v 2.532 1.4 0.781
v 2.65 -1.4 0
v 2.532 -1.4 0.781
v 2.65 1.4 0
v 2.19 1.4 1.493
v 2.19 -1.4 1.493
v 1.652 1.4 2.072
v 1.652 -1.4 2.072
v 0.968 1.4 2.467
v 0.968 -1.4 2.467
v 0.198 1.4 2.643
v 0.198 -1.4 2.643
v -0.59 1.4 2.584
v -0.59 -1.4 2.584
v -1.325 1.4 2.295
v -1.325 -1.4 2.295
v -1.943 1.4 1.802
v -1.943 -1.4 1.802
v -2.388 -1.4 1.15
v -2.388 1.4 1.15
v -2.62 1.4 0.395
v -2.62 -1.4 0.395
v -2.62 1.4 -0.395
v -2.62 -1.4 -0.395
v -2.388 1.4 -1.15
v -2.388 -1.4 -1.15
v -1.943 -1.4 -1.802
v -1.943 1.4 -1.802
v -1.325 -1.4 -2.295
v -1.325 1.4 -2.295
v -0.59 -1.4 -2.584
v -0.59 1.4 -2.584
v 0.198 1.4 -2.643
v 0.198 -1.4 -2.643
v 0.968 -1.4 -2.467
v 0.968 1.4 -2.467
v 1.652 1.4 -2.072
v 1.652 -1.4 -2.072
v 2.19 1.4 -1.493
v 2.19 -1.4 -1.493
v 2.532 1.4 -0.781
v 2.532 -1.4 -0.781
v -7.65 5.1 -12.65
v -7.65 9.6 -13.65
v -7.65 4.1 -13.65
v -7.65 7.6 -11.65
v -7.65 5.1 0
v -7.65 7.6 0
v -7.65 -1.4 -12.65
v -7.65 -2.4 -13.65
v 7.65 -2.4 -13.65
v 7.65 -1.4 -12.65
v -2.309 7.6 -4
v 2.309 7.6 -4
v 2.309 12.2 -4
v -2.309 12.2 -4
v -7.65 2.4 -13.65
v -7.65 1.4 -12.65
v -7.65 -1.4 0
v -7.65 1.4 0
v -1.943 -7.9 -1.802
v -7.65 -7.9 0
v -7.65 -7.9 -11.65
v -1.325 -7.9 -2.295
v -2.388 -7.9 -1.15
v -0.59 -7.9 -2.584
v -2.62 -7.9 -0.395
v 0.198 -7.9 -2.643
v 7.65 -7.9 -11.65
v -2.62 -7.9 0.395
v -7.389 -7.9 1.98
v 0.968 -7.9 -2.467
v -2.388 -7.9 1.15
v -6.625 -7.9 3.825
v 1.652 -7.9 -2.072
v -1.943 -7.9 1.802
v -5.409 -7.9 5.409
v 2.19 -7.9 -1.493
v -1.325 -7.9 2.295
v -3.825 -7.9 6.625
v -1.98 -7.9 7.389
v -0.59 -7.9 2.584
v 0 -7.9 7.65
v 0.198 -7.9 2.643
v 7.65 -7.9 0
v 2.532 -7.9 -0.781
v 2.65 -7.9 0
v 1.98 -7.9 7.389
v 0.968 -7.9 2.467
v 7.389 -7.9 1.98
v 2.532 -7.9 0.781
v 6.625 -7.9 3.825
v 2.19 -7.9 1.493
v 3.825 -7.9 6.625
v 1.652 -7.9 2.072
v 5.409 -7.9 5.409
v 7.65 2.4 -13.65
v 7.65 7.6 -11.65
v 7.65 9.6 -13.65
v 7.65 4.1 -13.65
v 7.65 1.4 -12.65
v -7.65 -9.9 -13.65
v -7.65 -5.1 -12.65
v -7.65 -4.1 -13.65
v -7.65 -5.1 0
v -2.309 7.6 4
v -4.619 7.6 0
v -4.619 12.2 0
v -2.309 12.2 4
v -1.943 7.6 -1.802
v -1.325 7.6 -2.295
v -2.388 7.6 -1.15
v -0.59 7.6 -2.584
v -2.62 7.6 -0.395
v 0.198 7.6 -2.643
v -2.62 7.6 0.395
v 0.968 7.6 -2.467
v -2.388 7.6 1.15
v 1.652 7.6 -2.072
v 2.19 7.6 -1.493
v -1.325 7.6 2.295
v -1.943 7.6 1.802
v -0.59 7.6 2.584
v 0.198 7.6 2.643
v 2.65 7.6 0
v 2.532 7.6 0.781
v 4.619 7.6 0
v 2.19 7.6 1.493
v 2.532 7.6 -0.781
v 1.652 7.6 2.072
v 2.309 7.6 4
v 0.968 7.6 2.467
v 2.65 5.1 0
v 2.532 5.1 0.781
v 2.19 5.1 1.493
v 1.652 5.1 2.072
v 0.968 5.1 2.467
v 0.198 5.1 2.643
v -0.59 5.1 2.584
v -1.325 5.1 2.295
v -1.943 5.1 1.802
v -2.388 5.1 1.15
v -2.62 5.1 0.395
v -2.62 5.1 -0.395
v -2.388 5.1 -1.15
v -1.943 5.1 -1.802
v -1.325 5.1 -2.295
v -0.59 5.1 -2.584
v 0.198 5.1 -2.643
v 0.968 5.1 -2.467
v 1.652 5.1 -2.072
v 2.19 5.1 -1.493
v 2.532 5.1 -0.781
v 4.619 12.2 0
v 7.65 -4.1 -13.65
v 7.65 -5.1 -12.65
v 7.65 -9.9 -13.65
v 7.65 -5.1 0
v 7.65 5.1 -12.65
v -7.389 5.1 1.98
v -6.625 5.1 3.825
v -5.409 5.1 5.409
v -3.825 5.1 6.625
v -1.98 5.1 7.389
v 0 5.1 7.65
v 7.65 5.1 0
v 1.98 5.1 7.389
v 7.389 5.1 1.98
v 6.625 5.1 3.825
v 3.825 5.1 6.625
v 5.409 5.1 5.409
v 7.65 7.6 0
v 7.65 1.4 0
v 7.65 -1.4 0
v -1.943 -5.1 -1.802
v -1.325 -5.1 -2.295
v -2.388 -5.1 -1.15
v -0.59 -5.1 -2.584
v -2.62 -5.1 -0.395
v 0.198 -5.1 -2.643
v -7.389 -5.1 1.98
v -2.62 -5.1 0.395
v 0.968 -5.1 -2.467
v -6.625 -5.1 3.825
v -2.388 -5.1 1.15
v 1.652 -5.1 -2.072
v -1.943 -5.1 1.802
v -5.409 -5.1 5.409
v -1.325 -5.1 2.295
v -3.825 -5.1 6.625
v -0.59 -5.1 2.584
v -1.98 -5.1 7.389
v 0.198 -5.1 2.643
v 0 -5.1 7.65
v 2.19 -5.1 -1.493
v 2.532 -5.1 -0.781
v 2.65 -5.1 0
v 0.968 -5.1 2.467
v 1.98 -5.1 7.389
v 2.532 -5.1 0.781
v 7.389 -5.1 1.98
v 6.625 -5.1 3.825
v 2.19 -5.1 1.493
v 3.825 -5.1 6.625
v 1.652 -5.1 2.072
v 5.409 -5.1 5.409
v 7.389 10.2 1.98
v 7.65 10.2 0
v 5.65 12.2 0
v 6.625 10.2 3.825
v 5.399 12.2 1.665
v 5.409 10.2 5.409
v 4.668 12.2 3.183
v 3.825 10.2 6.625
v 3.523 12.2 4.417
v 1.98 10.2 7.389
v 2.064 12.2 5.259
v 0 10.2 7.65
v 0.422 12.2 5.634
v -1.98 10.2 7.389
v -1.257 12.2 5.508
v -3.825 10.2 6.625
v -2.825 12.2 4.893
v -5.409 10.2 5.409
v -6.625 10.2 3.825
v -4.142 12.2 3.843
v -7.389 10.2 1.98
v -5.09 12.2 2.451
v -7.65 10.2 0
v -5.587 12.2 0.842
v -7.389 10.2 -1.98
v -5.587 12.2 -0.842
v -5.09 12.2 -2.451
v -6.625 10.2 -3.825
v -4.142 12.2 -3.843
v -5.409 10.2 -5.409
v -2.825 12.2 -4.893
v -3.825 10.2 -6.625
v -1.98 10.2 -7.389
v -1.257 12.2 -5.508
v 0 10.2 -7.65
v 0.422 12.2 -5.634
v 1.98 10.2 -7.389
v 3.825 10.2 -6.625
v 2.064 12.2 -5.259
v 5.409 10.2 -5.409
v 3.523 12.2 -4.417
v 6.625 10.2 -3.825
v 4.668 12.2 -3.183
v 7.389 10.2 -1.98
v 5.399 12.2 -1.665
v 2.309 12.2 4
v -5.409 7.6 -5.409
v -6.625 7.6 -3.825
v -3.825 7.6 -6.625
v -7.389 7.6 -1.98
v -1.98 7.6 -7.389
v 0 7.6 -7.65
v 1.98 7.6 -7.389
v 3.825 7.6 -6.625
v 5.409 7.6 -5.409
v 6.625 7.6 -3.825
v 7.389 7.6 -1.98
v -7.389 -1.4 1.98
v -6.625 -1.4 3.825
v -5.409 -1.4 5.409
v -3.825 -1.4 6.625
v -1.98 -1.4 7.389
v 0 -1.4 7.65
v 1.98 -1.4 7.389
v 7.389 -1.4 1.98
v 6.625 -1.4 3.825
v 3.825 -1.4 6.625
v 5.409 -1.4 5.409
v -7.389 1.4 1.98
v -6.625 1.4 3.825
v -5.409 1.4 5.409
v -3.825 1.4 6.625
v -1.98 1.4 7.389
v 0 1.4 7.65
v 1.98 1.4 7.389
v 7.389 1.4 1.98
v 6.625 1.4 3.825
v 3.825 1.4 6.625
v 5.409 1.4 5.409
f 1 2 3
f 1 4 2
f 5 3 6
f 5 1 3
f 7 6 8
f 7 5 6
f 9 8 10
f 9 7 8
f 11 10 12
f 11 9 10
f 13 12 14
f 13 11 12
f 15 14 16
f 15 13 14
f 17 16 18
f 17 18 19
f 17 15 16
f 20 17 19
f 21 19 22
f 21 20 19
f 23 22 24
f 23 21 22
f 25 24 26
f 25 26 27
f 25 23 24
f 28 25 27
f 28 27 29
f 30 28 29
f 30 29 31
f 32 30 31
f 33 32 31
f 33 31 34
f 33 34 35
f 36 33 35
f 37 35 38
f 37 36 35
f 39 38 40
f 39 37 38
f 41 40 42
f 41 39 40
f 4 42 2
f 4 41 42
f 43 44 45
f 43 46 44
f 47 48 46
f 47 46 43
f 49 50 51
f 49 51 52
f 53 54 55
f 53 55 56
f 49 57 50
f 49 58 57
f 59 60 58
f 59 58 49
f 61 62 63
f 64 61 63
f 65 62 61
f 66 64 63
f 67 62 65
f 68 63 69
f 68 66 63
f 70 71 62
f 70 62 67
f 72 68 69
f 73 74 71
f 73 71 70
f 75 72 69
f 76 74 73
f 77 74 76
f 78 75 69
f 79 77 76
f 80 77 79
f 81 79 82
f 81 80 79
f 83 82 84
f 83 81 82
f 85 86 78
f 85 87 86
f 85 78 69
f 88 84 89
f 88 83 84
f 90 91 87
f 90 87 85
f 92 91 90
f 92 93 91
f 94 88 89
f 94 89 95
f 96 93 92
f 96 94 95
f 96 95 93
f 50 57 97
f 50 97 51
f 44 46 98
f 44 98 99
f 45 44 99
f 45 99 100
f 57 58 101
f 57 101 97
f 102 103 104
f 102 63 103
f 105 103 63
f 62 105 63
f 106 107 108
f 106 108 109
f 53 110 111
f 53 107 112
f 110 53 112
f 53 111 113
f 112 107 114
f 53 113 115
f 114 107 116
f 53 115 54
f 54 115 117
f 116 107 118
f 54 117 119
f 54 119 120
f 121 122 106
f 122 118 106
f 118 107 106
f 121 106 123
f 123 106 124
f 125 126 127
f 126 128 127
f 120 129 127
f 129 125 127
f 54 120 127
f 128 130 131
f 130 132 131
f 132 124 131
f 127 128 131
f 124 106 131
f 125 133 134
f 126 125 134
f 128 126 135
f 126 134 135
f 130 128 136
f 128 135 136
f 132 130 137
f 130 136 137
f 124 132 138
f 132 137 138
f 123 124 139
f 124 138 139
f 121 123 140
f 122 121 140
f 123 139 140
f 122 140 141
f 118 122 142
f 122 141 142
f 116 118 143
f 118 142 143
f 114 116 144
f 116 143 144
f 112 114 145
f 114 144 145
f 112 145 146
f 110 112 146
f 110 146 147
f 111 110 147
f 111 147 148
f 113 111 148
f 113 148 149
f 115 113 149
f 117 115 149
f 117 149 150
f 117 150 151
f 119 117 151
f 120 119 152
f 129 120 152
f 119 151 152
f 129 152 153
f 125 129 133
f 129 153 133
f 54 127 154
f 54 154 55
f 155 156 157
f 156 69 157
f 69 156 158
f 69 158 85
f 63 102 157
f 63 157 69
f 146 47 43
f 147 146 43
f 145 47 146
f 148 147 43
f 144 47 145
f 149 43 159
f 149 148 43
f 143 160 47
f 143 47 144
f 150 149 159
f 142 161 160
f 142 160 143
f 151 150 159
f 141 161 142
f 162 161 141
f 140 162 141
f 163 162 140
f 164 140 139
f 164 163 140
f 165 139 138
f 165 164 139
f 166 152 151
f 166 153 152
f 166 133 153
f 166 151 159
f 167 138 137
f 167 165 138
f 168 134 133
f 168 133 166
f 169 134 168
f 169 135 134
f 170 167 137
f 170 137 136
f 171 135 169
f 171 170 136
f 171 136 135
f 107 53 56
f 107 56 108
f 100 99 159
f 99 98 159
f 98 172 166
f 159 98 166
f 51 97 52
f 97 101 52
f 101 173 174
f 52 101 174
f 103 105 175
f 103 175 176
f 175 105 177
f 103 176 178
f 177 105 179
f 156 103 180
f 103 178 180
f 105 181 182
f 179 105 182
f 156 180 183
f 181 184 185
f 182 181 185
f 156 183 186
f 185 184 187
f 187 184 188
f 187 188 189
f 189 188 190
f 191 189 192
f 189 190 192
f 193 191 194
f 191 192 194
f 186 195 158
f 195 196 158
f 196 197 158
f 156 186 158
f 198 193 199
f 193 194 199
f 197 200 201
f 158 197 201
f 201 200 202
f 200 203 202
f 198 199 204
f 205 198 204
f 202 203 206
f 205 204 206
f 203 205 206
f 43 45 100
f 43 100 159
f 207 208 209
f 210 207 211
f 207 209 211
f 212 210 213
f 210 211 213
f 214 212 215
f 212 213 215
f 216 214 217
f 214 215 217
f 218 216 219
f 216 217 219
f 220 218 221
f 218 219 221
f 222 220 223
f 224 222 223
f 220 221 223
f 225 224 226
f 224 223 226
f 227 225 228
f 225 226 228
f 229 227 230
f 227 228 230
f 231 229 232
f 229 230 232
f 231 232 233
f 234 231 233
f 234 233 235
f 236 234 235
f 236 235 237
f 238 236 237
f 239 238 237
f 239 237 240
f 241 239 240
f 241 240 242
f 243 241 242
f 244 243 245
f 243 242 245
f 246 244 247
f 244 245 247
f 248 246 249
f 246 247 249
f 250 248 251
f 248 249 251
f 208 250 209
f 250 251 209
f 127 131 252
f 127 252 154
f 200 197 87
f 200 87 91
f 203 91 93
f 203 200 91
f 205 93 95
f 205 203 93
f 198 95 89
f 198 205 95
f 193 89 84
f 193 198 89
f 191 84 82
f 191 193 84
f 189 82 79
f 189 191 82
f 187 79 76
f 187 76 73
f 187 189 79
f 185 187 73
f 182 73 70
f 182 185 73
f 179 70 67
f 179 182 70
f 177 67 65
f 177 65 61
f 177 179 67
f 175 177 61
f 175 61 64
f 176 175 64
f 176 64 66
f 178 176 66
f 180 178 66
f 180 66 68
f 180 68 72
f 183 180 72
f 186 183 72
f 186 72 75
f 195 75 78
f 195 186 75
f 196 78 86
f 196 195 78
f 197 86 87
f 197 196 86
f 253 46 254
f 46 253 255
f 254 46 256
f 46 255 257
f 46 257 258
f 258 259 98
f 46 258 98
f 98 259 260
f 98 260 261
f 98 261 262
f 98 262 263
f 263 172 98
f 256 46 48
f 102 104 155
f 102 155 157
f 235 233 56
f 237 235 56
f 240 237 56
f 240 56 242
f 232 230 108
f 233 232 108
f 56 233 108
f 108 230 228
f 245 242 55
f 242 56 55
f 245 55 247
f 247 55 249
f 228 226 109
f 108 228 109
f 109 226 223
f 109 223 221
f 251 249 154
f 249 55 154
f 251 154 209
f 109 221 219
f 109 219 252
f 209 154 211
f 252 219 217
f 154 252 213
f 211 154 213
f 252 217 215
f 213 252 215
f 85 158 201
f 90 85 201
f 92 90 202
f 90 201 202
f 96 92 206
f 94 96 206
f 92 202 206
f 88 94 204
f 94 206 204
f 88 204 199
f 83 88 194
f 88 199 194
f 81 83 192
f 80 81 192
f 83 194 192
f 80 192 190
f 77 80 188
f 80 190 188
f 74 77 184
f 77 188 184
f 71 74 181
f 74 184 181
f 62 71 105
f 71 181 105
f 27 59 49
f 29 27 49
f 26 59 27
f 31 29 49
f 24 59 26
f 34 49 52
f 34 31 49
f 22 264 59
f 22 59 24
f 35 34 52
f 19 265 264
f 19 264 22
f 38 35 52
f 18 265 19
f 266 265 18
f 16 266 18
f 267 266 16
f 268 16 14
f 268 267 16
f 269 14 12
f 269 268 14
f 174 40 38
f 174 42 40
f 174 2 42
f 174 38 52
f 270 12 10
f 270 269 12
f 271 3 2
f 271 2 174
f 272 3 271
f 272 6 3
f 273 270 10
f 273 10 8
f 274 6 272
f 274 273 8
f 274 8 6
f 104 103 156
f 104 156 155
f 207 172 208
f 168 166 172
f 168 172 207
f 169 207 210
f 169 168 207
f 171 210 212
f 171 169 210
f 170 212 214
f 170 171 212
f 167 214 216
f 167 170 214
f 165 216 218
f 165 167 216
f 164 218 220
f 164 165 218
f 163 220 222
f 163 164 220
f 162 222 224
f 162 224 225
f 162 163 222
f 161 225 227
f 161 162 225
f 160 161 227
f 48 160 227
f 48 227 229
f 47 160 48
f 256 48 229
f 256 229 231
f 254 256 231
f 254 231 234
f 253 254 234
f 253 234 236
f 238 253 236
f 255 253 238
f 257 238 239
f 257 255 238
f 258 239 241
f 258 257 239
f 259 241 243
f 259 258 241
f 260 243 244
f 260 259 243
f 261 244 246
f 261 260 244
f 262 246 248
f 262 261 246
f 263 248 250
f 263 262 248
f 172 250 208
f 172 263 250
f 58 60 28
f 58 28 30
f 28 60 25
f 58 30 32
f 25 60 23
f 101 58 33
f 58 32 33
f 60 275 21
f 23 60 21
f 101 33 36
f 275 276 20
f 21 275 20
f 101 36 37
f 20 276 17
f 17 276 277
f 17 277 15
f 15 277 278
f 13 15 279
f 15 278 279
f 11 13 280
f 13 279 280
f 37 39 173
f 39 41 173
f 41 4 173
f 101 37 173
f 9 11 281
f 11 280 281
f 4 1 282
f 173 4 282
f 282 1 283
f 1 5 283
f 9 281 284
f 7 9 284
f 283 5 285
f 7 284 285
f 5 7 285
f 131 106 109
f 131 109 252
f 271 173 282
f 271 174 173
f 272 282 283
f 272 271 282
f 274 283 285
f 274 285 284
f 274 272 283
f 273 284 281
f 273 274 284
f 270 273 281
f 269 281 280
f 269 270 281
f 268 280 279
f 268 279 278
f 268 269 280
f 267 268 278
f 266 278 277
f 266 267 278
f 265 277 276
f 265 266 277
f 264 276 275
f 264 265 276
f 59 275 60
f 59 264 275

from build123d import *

# Parameters (mm, degrees)
F0_R      = 2.65
F1_DEPTH  = 1.4
F2_START  = 5.1
F2_DEPTH  = 2.8
F3_START  = -5.1
F3_DEPTH  = 2.5
F4_START  = -7.5
F4_DEPTH  = 4.7
F5_SIZE   = 2
F10_DEPTH = 15.3


# Not quite as in the source:
# - a feature names something its author has since deleted; it is built from what else it names


with BuildPart() as f1:
    # F0 (on Front) → F1 (new body, symmetric)
    with BuildSketch(Plane.XZ):
        with BuildLine():
            ThreePointArc((-7.65, 0), (0, -7.65), (7.65, 0))
            ThreePointArc((7.65, 0), (0, 7.65), (-7.65, 0))
        make_face()
        Polygon((2.3094010768, 4), (4.6188021535, 0), (2.3094010768, -4), (-2.3094010768, -4), (-4.6188021535, 0), (-2.3094010768, 4), align=None, mode=Mode.SUBTRACT)
        Polygon((2.3094010768, -4), (4.6188021535, 0), (2.3094010768, 4), (-2.3094010768, 4), (-4.6188021535, 0), (-2.3094010768, -4), align=None)
        Circle(F0_R, mode=Mode.SUBTRACT)
        with BuildLine():
            Line((7.65, -13.65), (7.65, 0))
            ThreePointArc((7.65, 0), (0, -7.65), (-7.65, 0))
            Line((-7.65, 0), (-7.65, -13.65))
            Line((-7.65, -13.65), (7.65, -13.65))
        make_face()
    extrude(amount=F1_DEPTH, both=True)

    # F9 (on face) → F10, piece 2 (join, through all)
    with BuildSketch(Plane(origin=(-7.65, 0, 0), x_dir=(0, -1, 0), z_dir=(-1, 0, 0))):
        Polygon((-2.4, -13.65), (-1.4, -13.65), (-1.4, -12.65), align=None)
        Polygon((1.4, -12.65), (1.4, -13.65), (2.4, -13.65), align=None)
    extrude(amount=-F10_DEPTH)


with BuildPart() as f2:
    # F0 (on Front) → F2 (new body)
    with BuildSketch(Plane.XZ.offset(F2_START)):
        with BuildLine():
            ThreePointArc((-7.65, 0), (0, -7.65), (7.65, 0))
            ThreePointArc((7.65, 0), (0, 7.65), (-7.65, 0))
        make_face()
        Polygon((2.3094010768, 4), (4.6188021535, 0), (2.3094010768, -4), (-2.3094010768, -4), (-4.6188021535, 0), (-2.3094010768, 4), align=None, mode=Mode.SUBTRACT)
        Polygon((2.3094010768, -4), (4.6188021535, 0), (2.3094010768, 4), (-2.3094010768, 4), (-4.6188021535, 0), (-2.3094010768, -4), align=None)
        Circle(F0_R, mode=Mode.SUBTRACT)
        with BuildLine():
            Line((7.65, -13.65), (7.65, 0))
            ThreePointArc((7.65, 0), (0, -7.65), (-7.65, 0))
            Line((-7.65, 0), (-7.65, -13.65))
            Line((-7.65, -13.65), (7.65, -13.65))
        make_face()
    extrude(amount=F2_DEPTH)

    # F7 (on face) + F9 (on face) → F10, piece 3 (join, through all)
    with BuildSketch(Plane(origin=(-7.65, 0, 0), x_dir=(0, -1, 0), z_dir=(-1, 0, 0))):
        Polygon((7.9, -11.65), (7.9, -13.65), (9.9, -13.65), align=None)
    with BuildSketch(Plane(origin=(-7.65, 0, 0), x_dir=(0, -1, 0), z_dir=(-1, 0, 0))):
        Polygon((4.1, -13.65), (5.1, -13.65), (5.1, -12.65), align=None)
    extrude(amount=-F10_DEPTH)


with BuildPart() as f3:
    # F0 (on Front) → F3 (new body)
    with BuildSketch(Plane.XZ.offset(F3_START)):
        with BuildLine():
            ThreePointArc((-7.65, 0), (0, -7.65), (7.65, 0))
            ThreePointArc((7.65, 0), (0, 7.65), (-7.65, 0))
        make_face()
        Polygon((2.3094010768, 4), (4.6188021535, 0), (2.3094010768, -4), (-2.3094010768, -4), (-4.6188021535, 0), (-2.3094010768, 4), align=None, mode=Mode.SUBTRACT)
        Polygon((2.3094010768, -4), (4.6188021535, 0), (2.3094010768, 4), (-2.3094010768, 4), (-4.6188021535, 0), (-2.3094010768, -4), align=None)
        Circle(F0_R, mode=Mode.SUBTRACT)
        with BuildLine():
            Line((7.65, -13.65), (7.65, 0))
            ThreePointArc((7.65, 0), (0, -7.65), (-7.65, 0))
            Line((-7.65, 0), (-7.65, -13.65))
            Line((-7.65, -13.65), (7.65, -13.65))
        make_face()
    extrude(amount=-F3_DEPTH)

    # F0 (on Front) → F4 (join)
    with BuildSketch(Plane.XZ.offset(F4_START)):
        with BuildLine():
            ThreePointArc((-7.65, 0), (0, -7.65), (7.65, 0))
            ThreePointArc((7.65, 0), (0, 7.65), (-7.65, 0))
        make_face()
        Polygon((2.3094010768, 4), (4.6188021535, 0), (2.3094010768, -4), (-2.3094010768, -4), (-4.6188021535, 0), (-2.3094010768, 4), align=None, mode=Mode.SUBTRACT)
    extrude(amount=-F4_DEPTH)

    # F5
    f5_edges = [f3.edges().sort_by_distance(p)[0] for p in [
        (-7.65, 12.2, 0),
    ]]
    chamfer(f5_edges, length=F5_SIZE)

    # F6 (on face) + F8 (on face) → F10 (join, through all)
    with BuildSketch(Plane(origin=(-7.65, 0, 0), x_dir=(0, -1, 0), z_dir=(-1, 0, 0))):
        Polygon((-9.6, -13.65), (-7.6, -13.65), (-7.6, -11.65), align=None)
    with BuildSketch(Plane(origin=(-7.65, 0, 0), x_dir=(0, -1, 0), z_dir=(-1, 0, 0))):
        Polygon((-5.1, -12.65), (-5.1, -13.65), (-4.1, -13.65), align=None)
    extrude(amount=-F10_DEPTH)


solid = Compound([f1.part, f2.part, f3.part])
